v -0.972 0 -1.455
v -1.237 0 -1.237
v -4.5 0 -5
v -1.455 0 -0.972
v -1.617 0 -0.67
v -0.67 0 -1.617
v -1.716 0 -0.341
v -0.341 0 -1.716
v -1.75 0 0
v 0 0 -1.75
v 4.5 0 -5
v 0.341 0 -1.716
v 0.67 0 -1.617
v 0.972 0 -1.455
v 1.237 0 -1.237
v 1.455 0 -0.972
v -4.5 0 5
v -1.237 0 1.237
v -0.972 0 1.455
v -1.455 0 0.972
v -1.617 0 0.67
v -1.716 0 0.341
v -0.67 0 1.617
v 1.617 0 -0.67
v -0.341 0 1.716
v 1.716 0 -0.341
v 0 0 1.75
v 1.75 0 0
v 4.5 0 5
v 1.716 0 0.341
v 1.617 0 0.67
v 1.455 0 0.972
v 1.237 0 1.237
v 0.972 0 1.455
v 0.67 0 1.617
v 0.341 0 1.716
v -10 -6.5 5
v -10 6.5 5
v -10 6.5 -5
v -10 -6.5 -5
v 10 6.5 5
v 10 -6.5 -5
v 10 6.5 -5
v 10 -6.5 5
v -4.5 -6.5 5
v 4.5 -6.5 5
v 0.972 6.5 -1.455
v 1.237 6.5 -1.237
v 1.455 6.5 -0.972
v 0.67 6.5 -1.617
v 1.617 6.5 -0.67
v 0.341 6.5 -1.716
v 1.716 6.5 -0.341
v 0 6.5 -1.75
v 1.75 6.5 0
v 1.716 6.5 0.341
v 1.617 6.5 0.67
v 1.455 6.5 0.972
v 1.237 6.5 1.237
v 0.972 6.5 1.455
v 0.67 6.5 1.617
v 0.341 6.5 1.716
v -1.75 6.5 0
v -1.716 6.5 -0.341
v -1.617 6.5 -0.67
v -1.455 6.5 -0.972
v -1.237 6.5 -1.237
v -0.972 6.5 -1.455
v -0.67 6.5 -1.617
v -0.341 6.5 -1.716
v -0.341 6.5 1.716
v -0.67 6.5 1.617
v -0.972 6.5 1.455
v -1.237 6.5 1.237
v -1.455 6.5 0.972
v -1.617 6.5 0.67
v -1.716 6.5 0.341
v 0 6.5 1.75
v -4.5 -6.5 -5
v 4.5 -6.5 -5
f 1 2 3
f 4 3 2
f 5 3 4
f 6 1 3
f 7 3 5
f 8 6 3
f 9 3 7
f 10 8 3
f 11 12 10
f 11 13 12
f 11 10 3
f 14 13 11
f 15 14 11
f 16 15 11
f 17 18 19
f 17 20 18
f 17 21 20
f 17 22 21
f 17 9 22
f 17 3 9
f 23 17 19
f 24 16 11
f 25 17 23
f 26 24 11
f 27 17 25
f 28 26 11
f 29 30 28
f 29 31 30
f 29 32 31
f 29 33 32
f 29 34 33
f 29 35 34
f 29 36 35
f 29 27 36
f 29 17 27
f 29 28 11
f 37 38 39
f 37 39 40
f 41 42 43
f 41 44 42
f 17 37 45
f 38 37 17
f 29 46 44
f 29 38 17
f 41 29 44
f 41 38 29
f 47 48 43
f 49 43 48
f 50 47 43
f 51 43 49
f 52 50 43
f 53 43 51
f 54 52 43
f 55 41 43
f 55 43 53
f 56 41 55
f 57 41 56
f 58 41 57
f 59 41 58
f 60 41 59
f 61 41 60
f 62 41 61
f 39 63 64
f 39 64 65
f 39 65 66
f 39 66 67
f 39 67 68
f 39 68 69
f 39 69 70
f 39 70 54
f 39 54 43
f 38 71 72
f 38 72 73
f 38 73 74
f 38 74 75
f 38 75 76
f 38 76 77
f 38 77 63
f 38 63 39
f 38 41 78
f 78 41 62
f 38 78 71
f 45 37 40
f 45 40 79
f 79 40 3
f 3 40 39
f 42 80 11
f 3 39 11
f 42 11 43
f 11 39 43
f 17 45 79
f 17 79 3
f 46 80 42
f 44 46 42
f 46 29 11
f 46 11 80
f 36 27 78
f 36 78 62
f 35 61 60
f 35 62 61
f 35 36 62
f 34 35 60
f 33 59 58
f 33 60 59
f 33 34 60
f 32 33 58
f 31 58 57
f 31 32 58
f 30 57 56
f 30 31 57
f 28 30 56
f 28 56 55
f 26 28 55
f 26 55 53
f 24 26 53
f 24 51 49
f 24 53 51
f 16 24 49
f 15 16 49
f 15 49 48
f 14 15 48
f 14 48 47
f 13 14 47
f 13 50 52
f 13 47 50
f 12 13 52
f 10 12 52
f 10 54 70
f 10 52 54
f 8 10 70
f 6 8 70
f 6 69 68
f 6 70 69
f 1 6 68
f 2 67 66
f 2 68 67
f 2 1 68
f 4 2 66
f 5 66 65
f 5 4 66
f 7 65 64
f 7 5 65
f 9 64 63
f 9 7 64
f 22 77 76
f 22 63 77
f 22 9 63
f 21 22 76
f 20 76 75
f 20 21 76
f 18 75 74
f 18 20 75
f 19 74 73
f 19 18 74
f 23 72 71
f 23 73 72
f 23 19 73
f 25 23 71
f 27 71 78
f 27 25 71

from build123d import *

# Parameters (mm, degrees)
EXTRUDE_1_DEPTH          = 5
CUT_EXTRUDE_1_DEPTH      = 18.146428199
CUT_EXTRUDE_1_DEPTH_BACK = 18.146428199
SKETCH_2_R               = 1.75


with BuildPart() as part:
    # 草图1 → 凸台-拉伸1 (new, symmetric)
    with BuildSketch(Plane.XY):
        Polygon((10, 6.5), (-10, 6.5), (-10, -6.5), (-4.5, -6.5), (-4.5, 0), (4.5, 0), (4.5, -6.5), (10, -6.5), align=None)
    extrude(amount=EXTRUDE_1_DEPTH, both=True)

    # 草图2 → 切除-拉伸1 (cut, two sides: drawn at the far end of the back side and taken through both)
    with BuildSketch(Plane(origin=(0, 6.5, 0), x_dir=(1, 0, 0), z_dir=(0, 1, 0)).offset(-CUT_EXTRUDE_1_DEPTH_BACK)):
        with Locations(Location((0, 0, 0), (0, 0, 270))):
            Circle(SKETCH_2_R)
    extrude(amount=CUT_EXTRUDE_1_DEPTH + CUT_EXTRUDE_1_DEPTH_BACK, mode=Mode.SUBTRACT)


solid = part.part
